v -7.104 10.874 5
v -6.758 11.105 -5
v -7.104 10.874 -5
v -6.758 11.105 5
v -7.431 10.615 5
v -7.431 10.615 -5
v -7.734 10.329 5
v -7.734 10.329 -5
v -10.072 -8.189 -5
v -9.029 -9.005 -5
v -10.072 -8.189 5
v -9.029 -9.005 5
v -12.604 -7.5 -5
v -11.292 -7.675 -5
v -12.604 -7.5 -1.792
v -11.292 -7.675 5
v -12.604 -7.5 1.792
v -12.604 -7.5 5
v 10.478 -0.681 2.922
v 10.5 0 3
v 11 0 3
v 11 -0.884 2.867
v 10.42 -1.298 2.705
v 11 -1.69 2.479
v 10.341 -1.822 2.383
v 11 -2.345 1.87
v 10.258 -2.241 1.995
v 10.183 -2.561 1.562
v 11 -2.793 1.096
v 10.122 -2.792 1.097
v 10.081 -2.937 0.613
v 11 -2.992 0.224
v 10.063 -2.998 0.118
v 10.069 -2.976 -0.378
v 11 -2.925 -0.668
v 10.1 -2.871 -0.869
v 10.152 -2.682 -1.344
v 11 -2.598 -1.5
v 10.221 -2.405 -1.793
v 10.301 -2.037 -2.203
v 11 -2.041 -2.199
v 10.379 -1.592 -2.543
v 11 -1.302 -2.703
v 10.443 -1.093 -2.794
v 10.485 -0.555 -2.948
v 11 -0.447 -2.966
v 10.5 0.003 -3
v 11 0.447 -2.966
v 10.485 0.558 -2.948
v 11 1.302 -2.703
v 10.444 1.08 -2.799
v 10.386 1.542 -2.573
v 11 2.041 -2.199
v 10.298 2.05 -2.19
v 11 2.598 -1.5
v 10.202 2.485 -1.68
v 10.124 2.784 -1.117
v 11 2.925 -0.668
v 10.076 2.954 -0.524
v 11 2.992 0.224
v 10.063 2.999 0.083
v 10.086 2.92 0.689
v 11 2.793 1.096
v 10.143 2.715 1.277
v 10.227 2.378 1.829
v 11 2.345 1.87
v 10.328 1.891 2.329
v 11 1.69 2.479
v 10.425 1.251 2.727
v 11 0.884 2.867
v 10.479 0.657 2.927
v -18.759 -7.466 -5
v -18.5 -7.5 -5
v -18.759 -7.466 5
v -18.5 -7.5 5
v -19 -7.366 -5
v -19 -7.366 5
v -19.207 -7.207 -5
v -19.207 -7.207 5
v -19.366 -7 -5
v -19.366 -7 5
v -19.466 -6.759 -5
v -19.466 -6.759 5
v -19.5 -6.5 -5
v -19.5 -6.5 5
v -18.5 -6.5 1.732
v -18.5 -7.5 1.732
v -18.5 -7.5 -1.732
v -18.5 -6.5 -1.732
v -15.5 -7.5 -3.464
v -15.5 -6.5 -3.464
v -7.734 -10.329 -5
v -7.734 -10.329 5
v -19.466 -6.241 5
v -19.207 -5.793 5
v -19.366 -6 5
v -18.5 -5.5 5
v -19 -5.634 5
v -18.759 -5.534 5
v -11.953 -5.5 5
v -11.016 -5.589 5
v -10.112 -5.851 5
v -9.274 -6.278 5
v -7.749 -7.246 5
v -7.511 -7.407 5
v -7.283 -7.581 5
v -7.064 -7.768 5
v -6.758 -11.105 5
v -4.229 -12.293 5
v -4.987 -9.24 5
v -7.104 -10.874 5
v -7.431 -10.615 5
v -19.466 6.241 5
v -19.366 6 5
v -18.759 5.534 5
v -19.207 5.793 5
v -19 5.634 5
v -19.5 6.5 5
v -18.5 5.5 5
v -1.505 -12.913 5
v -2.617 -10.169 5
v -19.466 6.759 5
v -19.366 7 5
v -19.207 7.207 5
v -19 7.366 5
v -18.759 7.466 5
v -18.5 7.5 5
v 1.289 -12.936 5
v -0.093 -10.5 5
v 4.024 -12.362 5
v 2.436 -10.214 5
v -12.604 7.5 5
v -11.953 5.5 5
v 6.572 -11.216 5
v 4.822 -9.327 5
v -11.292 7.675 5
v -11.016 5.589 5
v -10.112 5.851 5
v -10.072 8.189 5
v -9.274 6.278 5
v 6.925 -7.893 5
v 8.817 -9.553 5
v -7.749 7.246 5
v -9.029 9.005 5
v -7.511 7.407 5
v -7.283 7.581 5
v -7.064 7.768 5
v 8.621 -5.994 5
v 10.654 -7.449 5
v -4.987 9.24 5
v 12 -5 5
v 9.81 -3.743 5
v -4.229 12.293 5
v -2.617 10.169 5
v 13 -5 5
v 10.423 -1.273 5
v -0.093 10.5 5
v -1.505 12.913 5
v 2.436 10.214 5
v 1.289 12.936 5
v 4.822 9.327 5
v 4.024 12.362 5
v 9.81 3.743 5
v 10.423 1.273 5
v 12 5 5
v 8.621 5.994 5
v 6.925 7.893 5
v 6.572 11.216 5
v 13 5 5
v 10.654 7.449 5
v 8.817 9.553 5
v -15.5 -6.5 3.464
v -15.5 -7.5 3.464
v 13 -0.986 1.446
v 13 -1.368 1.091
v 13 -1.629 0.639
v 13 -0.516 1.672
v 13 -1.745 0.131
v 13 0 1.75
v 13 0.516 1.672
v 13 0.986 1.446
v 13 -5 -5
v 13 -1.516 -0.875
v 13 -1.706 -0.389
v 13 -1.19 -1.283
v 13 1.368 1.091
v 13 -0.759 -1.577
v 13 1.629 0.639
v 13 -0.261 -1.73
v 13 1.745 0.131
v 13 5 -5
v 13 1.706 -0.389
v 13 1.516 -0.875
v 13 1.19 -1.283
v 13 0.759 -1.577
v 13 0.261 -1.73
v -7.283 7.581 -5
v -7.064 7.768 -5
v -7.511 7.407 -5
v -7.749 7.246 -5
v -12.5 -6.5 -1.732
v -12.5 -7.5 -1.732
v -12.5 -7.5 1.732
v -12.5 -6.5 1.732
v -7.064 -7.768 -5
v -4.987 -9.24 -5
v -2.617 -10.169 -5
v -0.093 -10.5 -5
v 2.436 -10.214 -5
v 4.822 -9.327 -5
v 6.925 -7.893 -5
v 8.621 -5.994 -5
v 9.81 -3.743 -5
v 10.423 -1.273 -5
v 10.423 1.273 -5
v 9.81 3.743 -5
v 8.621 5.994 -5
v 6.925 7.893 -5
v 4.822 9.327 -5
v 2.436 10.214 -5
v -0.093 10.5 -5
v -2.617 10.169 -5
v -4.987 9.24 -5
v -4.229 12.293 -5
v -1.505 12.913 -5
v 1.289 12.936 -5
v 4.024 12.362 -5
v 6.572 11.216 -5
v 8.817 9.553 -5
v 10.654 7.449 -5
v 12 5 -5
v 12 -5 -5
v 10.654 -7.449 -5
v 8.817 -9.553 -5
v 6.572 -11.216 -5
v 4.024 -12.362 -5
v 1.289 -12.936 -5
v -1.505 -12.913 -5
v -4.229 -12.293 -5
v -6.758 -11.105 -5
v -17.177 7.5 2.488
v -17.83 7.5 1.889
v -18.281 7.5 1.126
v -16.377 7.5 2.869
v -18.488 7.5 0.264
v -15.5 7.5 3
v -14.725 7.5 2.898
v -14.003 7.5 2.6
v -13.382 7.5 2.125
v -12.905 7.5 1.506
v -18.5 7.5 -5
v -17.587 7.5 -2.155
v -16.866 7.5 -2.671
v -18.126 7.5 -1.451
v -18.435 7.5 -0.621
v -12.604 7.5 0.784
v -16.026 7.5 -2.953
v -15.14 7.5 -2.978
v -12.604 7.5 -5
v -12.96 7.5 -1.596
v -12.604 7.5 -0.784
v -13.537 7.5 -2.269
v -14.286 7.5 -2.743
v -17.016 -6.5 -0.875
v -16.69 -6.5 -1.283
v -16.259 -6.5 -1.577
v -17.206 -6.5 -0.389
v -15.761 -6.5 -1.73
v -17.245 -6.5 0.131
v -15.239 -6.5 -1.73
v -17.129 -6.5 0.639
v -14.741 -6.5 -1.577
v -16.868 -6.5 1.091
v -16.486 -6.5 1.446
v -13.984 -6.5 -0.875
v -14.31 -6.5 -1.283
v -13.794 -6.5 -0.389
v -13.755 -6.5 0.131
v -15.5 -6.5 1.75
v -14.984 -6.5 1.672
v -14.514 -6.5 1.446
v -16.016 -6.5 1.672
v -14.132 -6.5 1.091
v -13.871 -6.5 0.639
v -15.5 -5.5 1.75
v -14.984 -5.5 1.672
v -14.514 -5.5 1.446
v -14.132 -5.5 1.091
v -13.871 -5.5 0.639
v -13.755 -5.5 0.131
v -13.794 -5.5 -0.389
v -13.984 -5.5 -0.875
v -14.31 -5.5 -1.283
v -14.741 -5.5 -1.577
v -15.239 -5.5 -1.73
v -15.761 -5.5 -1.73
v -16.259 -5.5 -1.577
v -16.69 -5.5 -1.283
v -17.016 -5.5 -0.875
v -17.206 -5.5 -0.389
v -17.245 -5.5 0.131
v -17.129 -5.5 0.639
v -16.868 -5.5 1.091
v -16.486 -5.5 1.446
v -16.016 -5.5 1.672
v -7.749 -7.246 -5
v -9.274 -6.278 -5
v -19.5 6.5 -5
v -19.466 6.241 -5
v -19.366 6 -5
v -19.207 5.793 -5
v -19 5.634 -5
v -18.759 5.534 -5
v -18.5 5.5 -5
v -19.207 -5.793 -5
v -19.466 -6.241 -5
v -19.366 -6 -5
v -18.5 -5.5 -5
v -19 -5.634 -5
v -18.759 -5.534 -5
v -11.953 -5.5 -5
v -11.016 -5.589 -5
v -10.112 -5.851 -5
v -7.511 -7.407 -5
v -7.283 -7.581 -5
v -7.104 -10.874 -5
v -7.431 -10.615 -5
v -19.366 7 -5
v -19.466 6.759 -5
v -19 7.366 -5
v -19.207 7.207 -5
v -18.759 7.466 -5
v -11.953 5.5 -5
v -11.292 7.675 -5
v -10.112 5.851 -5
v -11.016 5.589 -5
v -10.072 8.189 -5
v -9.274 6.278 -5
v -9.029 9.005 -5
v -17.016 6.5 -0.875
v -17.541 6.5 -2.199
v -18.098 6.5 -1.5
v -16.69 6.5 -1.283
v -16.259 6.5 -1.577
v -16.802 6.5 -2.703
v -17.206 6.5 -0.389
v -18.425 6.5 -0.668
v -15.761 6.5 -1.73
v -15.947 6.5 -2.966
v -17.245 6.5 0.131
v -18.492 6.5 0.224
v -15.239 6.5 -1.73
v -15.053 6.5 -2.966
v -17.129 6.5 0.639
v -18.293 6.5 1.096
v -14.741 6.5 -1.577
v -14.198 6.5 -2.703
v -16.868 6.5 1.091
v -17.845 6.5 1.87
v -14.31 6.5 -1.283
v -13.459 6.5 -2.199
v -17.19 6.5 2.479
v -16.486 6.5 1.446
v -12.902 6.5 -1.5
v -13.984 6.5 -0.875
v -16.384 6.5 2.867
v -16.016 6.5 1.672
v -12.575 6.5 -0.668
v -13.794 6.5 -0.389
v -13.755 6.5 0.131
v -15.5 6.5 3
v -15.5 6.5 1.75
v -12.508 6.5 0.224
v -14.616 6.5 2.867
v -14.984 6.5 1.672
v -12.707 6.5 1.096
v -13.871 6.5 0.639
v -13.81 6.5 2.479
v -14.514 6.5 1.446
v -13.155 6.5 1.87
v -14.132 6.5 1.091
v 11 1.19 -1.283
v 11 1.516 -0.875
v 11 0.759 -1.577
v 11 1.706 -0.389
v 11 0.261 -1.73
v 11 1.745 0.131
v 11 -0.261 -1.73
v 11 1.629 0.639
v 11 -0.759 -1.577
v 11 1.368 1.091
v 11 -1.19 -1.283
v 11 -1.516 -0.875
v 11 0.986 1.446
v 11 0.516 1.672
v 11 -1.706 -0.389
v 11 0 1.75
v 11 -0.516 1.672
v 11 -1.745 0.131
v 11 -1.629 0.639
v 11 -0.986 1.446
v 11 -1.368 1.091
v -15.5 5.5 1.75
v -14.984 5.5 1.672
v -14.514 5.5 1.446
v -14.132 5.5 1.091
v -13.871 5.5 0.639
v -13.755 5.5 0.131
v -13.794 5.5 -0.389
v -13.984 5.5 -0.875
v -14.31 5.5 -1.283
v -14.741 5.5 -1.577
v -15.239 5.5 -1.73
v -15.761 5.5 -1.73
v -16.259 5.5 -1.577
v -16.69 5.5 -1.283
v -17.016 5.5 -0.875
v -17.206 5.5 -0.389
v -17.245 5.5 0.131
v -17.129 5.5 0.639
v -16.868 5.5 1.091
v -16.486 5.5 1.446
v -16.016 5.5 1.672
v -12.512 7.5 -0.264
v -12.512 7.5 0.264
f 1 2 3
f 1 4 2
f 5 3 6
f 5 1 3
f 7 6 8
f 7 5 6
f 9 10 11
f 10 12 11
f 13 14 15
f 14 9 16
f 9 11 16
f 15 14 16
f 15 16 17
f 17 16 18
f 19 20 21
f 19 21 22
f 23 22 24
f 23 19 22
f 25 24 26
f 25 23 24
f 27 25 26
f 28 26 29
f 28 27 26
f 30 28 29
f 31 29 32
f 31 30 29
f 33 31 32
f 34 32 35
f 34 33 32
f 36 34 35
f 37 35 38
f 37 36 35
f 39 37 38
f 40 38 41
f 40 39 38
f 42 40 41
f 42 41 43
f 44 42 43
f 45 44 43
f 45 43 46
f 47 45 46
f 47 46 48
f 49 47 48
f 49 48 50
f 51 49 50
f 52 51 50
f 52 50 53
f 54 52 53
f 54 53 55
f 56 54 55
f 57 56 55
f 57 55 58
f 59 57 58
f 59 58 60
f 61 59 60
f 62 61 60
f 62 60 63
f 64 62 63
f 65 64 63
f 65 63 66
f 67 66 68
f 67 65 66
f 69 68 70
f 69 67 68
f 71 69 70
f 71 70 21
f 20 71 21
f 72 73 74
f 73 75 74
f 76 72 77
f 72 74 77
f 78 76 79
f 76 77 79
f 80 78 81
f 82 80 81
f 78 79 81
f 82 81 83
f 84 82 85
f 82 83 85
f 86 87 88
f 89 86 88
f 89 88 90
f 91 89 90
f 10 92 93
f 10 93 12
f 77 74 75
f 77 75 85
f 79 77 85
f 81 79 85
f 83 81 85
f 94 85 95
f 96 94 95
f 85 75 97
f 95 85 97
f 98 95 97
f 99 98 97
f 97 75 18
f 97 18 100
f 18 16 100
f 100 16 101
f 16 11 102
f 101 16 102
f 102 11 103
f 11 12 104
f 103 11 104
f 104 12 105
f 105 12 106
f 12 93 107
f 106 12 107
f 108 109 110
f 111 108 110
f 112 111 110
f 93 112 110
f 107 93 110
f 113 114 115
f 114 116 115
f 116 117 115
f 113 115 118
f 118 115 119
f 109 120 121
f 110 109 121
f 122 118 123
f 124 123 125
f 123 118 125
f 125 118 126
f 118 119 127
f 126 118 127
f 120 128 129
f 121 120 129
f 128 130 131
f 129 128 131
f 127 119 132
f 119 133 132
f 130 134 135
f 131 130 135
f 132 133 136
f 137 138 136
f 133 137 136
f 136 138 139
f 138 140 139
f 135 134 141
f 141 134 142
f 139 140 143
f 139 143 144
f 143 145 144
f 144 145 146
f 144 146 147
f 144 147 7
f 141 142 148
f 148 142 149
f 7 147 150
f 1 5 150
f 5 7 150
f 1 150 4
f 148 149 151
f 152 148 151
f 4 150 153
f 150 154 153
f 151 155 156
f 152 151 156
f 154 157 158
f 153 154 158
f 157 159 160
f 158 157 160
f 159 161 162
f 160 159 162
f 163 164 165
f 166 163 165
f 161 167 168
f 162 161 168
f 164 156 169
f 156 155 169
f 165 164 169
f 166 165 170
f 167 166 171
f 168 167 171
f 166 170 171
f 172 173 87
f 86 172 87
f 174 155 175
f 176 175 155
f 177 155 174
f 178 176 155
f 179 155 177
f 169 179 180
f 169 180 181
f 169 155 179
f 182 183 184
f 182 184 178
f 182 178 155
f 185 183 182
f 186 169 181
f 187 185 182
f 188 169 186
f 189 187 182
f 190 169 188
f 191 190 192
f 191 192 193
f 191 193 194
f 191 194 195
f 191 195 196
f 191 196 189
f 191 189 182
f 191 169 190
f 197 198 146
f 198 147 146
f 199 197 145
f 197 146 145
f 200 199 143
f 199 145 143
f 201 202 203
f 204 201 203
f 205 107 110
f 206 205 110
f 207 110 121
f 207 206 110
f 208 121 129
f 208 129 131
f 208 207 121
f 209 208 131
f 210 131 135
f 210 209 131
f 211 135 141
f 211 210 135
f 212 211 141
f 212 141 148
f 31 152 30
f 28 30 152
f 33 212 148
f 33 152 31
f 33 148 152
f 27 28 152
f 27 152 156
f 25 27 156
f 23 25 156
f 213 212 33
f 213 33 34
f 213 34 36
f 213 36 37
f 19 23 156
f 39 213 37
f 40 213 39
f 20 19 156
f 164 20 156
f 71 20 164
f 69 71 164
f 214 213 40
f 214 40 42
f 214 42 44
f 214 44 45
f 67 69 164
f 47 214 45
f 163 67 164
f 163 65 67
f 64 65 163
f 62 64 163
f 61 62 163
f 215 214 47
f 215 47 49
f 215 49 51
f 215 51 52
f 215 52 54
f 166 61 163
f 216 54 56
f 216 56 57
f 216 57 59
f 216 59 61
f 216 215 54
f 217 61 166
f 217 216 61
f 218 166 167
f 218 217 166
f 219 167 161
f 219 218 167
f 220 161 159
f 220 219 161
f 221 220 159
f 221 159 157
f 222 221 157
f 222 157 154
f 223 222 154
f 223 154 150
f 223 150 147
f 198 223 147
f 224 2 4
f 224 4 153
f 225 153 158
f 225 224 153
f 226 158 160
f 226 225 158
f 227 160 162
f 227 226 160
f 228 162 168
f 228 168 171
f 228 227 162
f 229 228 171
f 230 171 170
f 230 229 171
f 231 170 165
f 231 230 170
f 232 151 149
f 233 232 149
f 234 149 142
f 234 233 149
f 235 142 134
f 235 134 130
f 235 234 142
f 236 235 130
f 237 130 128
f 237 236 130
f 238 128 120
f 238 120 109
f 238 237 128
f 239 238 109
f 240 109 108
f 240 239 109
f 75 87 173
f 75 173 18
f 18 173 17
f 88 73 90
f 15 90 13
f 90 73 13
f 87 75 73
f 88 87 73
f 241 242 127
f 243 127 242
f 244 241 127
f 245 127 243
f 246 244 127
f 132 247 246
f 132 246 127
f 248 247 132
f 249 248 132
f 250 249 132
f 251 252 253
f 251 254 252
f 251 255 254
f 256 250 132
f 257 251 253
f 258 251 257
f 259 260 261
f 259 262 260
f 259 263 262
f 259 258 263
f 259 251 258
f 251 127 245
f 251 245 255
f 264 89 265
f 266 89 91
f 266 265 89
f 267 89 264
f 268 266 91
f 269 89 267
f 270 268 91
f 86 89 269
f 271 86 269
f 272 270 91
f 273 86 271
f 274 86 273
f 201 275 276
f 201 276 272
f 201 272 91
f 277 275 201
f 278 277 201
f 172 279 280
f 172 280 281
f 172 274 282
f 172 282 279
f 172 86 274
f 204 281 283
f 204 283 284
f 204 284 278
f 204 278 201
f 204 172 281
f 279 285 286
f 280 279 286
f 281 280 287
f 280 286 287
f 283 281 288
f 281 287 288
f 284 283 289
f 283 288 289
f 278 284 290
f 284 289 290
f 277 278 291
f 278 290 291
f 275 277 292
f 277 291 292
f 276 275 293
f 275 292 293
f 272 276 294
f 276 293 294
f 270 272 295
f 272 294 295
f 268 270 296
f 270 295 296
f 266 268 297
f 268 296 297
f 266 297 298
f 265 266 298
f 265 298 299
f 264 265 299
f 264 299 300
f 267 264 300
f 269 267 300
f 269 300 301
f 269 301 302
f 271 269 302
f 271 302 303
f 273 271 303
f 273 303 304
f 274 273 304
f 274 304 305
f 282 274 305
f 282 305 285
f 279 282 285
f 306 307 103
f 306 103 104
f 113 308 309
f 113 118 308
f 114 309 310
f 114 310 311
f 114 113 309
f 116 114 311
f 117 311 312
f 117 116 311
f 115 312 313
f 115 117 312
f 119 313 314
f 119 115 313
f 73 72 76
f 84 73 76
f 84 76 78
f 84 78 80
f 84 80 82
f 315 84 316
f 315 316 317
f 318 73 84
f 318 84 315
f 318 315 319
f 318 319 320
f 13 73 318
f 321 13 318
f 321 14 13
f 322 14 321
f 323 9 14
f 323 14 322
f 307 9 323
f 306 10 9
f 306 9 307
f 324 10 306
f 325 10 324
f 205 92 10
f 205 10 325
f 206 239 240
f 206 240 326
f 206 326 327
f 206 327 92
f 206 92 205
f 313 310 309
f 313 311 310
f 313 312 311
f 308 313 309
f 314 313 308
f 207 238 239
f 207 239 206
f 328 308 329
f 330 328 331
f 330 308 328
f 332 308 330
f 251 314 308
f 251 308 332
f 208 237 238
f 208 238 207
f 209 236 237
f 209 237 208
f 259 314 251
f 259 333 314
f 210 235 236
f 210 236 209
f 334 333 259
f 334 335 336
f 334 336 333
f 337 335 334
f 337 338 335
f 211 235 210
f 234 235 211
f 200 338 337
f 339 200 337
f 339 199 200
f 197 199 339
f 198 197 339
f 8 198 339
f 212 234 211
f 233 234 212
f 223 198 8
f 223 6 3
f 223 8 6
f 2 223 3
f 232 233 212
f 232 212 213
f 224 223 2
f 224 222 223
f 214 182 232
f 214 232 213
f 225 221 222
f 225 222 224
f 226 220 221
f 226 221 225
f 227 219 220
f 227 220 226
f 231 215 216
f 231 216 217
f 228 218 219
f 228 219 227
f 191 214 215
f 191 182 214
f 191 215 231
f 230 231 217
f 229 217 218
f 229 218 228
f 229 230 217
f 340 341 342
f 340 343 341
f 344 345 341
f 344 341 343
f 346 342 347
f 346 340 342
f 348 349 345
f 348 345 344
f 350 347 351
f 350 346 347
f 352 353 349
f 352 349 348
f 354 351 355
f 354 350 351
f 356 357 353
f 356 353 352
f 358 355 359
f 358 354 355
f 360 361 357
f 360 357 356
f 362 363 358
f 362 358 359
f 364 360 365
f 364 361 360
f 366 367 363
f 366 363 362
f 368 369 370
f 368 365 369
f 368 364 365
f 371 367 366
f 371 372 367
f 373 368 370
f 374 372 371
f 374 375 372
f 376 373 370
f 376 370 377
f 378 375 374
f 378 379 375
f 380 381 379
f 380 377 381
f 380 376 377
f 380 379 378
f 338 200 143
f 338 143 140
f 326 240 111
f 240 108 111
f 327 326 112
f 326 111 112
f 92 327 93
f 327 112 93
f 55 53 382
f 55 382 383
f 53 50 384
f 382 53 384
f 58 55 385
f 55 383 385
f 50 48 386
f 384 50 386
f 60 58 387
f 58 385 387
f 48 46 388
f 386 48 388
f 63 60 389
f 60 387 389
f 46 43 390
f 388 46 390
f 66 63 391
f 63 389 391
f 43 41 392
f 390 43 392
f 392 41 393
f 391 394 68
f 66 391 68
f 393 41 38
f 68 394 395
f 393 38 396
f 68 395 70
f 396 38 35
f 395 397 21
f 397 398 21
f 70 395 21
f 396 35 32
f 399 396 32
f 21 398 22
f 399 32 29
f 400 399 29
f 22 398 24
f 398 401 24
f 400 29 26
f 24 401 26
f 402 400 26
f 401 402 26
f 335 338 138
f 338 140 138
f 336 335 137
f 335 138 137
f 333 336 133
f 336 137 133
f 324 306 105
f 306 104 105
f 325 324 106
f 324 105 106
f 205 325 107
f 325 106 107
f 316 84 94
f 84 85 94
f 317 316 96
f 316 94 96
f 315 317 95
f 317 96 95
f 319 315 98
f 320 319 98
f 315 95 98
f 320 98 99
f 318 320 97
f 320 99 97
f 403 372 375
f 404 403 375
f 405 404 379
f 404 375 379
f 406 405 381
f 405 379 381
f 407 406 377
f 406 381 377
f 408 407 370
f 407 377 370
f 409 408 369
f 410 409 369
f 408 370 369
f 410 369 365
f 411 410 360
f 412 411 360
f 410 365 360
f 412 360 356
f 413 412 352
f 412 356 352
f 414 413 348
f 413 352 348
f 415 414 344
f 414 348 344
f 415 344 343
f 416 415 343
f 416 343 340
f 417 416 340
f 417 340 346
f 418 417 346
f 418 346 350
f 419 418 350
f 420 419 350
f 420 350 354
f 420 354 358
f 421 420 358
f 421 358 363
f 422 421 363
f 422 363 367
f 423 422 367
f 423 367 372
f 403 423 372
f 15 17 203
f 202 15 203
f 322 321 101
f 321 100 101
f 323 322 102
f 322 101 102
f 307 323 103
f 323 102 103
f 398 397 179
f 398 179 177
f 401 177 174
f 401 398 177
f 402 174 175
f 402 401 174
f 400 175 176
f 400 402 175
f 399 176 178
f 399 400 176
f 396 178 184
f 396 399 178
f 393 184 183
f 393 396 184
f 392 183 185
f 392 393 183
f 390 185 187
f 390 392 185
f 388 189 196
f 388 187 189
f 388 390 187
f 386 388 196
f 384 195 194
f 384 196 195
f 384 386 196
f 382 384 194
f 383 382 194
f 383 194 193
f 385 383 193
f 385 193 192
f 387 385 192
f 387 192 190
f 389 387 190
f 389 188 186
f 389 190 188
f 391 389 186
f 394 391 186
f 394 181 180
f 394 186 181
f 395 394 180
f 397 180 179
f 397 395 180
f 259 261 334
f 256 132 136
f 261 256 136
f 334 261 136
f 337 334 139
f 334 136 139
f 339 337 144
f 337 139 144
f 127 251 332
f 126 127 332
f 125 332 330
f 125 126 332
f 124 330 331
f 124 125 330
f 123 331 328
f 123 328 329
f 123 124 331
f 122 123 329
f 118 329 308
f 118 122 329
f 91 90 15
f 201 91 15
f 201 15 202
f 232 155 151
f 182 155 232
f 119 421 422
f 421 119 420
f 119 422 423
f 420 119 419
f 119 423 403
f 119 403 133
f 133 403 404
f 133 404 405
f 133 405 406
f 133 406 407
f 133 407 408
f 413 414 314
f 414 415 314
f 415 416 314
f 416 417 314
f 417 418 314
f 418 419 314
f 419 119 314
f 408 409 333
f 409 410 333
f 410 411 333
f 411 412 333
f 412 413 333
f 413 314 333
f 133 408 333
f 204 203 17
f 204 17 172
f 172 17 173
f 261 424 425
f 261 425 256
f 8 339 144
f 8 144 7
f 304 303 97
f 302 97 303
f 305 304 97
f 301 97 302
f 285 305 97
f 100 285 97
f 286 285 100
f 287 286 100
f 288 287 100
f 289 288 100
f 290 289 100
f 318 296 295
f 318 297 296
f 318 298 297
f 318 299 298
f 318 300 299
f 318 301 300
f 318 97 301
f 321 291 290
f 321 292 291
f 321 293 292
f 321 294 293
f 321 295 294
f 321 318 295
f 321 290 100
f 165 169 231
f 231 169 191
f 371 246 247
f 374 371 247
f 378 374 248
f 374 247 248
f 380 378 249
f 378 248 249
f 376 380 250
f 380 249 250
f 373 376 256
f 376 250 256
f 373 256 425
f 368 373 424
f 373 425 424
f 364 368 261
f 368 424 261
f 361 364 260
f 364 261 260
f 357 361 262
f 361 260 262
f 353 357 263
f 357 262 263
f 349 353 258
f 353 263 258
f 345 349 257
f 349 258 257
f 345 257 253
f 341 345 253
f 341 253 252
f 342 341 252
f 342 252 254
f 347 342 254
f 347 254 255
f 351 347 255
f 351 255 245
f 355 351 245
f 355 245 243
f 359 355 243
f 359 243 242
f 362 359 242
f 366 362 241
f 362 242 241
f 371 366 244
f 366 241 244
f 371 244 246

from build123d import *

# Parameters (mm, degrees)
EXTRUDE_1_DEPTH      = 5
EXTRUDE_1_DEPTH_BACK = 5
SKETCH_367_W         = 9
SKETCH_367_H         = 2
FILLET_1_R           = 5
FILLET_2_R           = 1
SKETCH_1_R           = 1.75
CUT_EXTRUDE_2_DEPTH  = 29.731515797
SKETCH_1_6_R         = 3
CUT_EXTRUDE_3_DEPTH  = 1
SKETCH_5_W           = 10
SKETCH_5_H           = 10
EXTRUDE_2_DEPTH      = 2
SKETCH_6_R           = 1.75
CUT_EXTRUDE_5_DEPTH  = 24.963513933
SKETCH_6_3_R         = 3
CUT_EXTRUDE_6_DEPTH  = 11
CUT_EXTRUDE_7_DEPTH  = 1


with BuildPart() as part:
    # Sketch 367 → Бобышка-Вытянуть1 (new, two sides: drawn at the far end of the back side and taken through both)
    with BuildSketch(Plane.XY.offset(-EXTRUDE_1_DEPTH_BACK)):
        with BuildLine():
            ThreePointArc((-7.348469228, 10.723805295), (13, 0), (-7.348469228, -10.723805295))
            Line((-7.348469228, -10.723805295), (-10.5, -7.5))
            Line((-10.5, -7.5), (-10.5, -5.5))
            Line((-10.5, -5.5), (-7.348469228, -7.5))
            ThreePointArc((-7.348469228, -7.5), (10.5, 0), (-7.348469228, 7.5))
            Line((-7.348469228, 7.5), (-10.5, 5.5))
            Line((-10.5, 5.5), (-10.5, 7.5))
            Line((-10.5, 7.5), (-7.348469228, 10.723805295))
        make_face()
        with Locations((-15, 6.5)):
            Rectangle(SKETCH_367_W, SKETCH_367_H)
        with Locations((-15, -6.5)):
            Rectangle(SKETCH_367_W, SKETCH_367_H)
    extrude(amount=EXTRUDE_1_DEPTH + EXTRUDE_1_DEPTH_BACK)

    # Скругление1
    fillet_1_edges = [part.edges().sort_by_distance(p)[0] for p in [
        (-7.348469228, -10.723805295, 0),
        (-10.5, -7.5, 0),
        (-10.5, -5.5, 0),
        (-7.348469228, -7.5, 0),
        (-7.348469228, 7.5, 0),
        (-10.5, 5.5, 0),
        (-10.5, 7.5, 0),
        (-7.348469228, 10.723805295, 0),
    ]]
    fillet(fillet_1_edges, radius=FILLET_1_R)

    # Скругление2
    fillet_2_edges = [part.edges().sort_by_distance(p)[0] for p in [
        (-19.5, -7.5, 0),
        (-19.5, -5.5, 0),
        (-19.5, 5.5, 0),
        (-19.5, 7.5, 0),
    ]]
    fillet(fillet_2_edges, radius=FILLET_2_R - 0.0001)  # a hair under: the kernel refuses the full size

    # Эскиз1 → Вырез-Вытянуть2 (cut, through all)
    with BuildSketch(Plane(origin=(0, 7.5, 0), x_dir=(1, 0, 0), z_dir=(0, 1, 0))):
        with Locations(Location((-15.5, 0, 0), (0, 0, 270))):
            Circle(SKETCH_1_R)
    extrude(amount=-CUT_EXTRUDE_2_DEPTH, mode=Mode.SUBTRACT)

    # Эскиз1<6> → Вырез-Вытянуть3 (cut)
    with BuildSketch(Plane(origin=(0, 7.5, 0), x_dir=(1, 0, 0), z_dir=(0, 1, 0))):
        with Locations(Location((-15.5, 0, 0), (0, 0, 270))):
            Circle(SKETCH_1_6_R)
    extrude(amount=-CUT_EXTRUDE_3_DEPTH, mode=Mode.SUBTRACT)

    # Эскиз5 → Бобышка-Вытянуть2 (add)
    with BuildSketch(Plane(origin=(13, 0, 0), x_dir=(0, 0, -1), z_dir=(1, 0, 0))):
        Rectangle(SKETCH_5_W, SKETCH_5_H)
    extrude(amount=-EXTRUDE_2_DEPTH)

    # Эскиз6 → Вырез-Вытянуть5 (cut, through all)
    with BuildSketch(Plane(origin=(0, 0, 0), x_dir=(0, 0, -1), z_dir=(1, 0, 0))):
        with Locations(Location((0, 0, 0), (0, 0, 180))):
            Circle(SKETCH_6_R)
    extrude(amount=CUT_EXTRUDE_5_DEPTH, mode=Mode.SUBTRACT)

    # Эскиз6<3> → Вырез-Вытянуть6 (cut)
    with BuildSketch(Plane(origin=(0, 0, 0), x_dir=(0, 0, -1), z_dir=(1, 0, 0))):
        with Locations(Location((0, 0, 0), (0, 0, 180))):
            Circle(SKETCH_6_3_R)
    extrude(amount=CUT_EXTRUDE_6_DEPTH, mode=Mode.SUBTRACT)

    # Эскиз8 → Вырез-Вытянуть7 (cut)
    with BuildSketch(Plane.XZ.offset(7.5)):
        Polygon((-15.5, 3.464101615), (-18.5, 1.732050808), (-18.5, -1.732050808), (-15.5, -3.464101615), (-12.5, -1.732050808), (-12.5, 1.732050808), align=None)
    extrude(amount=-CUT_EXTRUDE_7_DEPTH, mode=Mode.SUBTRACT)


solid = part.part
